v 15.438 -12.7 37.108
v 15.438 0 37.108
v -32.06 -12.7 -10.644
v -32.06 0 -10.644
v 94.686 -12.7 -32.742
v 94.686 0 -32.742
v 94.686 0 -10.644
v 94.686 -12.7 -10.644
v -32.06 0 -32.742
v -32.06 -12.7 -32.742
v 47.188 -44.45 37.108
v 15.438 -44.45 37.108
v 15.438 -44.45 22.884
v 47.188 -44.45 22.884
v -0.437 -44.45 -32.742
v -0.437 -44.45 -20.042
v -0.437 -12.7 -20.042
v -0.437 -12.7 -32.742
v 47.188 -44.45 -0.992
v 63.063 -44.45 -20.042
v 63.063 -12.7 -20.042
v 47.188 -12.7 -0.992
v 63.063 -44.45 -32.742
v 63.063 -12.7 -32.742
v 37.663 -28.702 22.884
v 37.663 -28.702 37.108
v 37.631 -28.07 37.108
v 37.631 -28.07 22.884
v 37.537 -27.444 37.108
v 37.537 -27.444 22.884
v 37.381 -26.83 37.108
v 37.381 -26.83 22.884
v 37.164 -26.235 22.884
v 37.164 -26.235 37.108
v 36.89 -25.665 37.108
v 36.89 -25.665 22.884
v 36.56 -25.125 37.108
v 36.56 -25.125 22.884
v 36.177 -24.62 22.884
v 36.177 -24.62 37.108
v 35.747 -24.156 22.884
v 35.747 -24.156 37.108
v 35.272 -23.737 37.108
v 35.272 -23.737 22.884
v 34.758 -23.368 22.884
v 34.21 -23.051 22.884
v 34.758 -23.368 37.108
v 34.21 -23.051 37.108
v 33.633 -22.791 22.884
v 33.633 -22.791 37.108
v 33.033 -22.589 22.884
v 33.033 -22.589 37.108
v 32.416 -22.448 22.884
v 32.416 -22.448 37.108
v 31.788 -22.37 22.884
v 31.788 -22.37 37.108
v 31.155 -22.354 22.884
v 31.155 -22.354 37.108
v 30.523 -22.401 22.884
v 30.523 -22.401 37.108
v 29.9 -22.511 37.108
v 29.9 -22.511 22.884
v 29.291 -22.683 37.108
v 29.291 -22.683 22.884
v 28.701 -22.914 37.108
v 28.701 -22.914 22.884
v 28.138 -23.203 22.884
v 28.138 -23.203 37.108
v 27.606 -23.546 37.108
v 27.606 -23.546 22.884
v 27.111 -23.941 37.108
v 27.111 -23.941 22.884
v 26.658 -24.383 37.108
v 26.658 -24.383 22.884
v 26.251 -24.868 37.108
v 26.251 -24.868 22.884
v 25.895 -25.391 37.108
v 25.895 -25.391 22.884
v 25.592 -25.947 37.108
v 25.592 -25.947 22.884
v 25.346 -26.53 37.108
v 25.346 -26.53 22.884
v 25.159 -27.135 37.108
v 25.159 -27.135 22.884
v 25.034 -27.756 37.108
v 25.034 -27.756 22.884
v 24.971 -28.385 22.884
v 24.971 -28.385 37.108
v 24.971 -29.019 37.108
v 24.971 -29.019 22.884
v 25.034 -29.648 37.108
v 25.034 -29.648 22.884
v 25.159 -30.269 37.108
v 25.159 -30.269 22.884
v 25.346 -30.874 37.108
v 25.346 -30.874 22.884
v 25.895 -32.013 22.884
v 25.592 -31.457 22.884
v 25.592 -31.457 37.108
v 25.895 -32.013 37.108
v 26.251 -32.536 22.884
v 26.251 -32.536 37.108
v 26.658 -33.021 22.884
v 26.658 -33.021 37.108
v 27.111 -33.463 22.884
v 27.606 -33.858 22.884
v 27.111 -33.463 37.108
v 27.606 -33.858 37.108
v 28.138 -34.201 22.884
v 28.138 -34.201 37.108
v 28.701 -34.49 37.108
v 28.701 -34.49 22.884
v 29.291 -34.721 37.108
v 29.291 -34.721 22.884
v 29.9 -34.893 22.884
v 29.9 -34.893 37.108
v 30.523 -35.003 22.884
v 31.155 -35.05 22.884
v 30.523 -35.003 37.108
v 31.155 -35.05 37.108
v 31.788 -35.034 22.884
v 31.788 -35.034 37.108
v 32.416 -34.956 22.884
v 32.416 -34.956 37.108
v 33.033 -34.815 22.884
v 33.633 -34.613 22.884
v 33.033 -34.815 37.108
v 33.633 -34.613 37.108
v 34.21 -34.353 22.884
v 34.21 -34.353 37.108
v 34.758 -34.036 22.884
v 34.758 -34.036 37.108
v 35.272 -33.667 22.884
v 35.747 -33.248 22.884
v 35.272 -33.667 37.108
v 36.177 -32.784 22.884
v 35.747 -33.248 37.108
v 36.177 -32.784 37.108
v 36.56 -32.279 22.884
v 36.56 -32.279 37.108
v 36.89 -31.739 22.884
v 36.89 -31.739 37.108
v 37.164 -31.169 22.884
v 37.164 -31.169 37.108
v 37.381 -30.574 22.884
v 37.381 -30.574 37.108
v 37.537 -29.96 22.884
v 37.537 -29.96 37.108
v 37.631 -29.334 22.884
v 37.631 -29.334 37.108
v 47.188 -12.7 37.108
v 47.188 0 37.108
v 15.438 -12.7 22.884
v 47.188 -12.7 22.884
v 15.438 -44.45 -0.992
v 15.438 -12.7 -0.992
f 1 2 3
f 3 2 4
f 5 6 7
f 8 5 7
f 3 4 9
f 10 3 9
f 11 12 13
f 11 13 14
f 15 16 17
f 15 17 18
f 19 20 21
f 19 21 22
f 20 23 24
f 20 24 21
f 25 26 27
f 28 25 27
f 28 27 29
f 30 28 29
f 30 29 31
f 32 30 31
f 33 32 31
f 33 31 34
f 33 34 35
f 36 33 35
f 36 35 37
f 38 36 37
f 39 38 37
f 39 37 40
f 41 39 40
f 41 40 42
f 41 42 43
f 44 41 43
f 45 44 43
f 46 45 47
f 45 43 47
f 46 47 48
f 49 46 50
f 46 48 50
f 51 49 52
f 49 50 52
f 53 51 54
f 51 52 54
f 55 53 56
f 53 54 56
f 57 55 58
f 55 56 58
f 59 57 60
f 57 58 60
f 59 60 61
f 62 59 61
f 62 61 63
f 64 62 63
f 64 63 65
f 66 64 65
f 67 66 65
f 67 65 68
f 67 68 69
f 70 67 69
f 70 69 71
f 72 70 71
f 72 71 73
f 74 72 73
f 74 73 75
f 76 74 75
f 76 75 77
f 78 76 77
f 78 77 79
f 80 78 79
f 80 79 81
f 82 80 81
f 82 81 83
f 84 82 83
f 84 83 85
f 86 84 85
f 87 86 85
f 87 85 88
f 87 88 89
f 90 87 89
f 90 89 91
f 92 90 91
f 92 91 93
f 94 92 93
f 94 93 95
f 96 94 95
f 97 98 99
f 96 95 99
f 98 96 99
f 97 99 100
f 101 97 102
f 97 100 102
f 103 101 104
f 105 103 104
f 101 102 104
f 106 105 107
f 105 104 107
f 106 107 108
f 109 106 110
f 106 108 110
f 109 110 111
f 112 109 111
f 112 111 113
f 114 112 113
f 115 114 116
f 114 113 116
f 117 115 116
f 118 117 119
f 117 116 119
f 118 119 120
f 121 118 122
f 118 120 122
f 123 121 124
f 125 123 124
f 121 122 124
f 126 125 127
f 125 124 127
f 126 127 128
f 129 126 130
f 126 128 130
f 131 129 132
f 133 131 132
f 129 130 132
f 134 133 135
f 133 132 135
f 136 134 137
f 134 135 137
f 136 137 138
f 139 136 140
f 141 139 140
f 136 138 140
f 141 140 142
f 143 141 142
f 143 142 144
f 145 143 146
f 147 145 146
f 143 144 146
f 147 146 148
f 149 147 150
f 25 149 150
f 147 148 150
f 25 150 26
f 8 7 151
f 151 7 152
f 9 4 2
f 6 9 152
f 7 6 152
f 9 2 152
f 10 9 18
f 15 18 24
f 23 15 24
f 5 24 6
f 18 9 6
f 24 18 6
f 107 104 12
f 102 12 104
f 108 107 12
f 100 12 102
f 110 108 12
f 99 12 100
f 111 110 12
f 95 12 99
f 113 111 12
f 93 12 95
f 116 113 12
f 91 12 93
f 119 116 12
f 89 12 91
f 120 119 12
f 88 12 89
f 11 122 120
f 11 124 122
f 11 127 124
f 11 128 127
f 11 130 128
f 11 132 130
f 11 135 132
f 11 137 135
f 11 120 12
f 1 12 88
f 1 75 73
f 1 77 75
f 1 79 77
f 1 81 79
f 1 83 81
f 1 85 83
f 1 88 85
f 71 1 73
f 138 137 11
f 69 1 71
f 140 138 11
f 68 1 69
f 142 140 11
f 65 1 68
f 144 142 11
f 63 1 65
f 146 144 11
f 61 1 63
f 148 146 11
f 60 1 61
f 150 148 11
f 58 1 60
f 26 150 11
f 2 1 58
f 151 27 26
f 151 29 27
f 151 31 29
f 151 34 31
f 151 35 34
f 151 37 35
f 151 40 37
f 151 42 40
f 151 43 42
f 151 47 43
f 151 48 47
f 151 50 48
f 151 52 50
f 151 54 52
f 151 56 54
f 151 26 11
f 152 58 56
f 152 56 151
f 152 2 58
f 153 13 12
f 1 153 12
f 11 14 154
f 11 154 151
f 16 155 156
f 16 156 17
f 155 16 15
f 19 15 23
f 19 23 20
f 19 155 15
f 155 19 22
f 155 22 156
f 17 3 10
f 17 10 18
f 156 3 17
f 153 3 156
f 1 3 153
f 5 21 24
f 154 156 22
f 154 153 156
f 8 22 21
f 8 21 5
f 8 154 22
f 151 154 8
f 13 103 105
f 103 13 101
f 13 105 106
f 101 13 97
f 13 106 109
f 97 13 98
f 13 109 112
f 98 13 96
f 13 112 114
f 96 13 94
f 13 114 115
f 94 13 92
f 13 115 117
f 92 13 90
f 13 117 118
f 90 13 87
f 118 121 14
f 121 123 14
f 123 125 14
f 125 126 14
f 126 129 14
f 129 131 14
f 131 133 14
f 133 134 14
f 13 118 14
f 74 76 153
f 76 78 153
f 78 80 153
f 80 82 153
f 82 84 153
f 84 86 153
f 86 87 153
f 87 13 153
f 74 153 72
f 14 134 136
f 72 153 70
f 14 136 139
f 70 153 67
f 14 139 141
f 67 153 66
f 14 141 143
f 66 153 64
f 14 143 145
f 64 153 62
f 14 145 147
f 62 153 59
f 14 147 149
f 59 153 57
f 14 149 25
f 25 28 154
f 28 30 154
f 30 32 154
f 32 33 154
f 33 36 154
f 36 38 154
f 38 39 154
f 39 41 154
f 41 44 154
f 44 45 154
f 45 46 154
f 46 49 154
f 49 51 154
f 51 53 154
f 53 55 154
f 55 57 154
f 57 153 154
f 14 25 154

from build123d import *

# Parameters (mm, degrees)
F1_DEPTH = 12.7
F2_W     = 31.75
F2_H     = 14.224
F3_DEPTH = 31.75
F4_R     = 6.35
F5_DEPTH = 25.4


with BuildPart() as f1:
    # F0 (on Front) → F1 (new body)
    with BuildSketch(Plane.XZ):
        Polygon((-32.059978, -10.644176), (-32.059978, -32.742176), (94.686022, -32.742176), (94.686022, -10.644176), (47.188022, 37.107824), (15.438022, 37.107824), align=None)
    extrude(amount=F1_DEPTH)

    # F2 (on face) → F3 (join)
    with BuildSketch(Plane.XZ.offset(12.7)):
        with Locations((31.313022, 29.995824)):
            Rectangle(F2_W, F2_H)
        Polygon((-0.436978, -20.042176), (-0.436978, -32.742176), (63.063022, -32.742176), (63.063022, -20.042176), (47.188022, -0.992176), (15.438022, -0.992176), align=None)
    extrude(amount=F3_DEPTH)

    # F4 (on face) → F5 (cut)
    with BuildSketch(Plane.XY.offset(37.107824)):
        with Locations((31.313022, -28.702)):
            Circle(F4_R)
    extrude(amount=-F5_DEPTH, mode=Mode.SUBTRACT)


solid = f1.part
